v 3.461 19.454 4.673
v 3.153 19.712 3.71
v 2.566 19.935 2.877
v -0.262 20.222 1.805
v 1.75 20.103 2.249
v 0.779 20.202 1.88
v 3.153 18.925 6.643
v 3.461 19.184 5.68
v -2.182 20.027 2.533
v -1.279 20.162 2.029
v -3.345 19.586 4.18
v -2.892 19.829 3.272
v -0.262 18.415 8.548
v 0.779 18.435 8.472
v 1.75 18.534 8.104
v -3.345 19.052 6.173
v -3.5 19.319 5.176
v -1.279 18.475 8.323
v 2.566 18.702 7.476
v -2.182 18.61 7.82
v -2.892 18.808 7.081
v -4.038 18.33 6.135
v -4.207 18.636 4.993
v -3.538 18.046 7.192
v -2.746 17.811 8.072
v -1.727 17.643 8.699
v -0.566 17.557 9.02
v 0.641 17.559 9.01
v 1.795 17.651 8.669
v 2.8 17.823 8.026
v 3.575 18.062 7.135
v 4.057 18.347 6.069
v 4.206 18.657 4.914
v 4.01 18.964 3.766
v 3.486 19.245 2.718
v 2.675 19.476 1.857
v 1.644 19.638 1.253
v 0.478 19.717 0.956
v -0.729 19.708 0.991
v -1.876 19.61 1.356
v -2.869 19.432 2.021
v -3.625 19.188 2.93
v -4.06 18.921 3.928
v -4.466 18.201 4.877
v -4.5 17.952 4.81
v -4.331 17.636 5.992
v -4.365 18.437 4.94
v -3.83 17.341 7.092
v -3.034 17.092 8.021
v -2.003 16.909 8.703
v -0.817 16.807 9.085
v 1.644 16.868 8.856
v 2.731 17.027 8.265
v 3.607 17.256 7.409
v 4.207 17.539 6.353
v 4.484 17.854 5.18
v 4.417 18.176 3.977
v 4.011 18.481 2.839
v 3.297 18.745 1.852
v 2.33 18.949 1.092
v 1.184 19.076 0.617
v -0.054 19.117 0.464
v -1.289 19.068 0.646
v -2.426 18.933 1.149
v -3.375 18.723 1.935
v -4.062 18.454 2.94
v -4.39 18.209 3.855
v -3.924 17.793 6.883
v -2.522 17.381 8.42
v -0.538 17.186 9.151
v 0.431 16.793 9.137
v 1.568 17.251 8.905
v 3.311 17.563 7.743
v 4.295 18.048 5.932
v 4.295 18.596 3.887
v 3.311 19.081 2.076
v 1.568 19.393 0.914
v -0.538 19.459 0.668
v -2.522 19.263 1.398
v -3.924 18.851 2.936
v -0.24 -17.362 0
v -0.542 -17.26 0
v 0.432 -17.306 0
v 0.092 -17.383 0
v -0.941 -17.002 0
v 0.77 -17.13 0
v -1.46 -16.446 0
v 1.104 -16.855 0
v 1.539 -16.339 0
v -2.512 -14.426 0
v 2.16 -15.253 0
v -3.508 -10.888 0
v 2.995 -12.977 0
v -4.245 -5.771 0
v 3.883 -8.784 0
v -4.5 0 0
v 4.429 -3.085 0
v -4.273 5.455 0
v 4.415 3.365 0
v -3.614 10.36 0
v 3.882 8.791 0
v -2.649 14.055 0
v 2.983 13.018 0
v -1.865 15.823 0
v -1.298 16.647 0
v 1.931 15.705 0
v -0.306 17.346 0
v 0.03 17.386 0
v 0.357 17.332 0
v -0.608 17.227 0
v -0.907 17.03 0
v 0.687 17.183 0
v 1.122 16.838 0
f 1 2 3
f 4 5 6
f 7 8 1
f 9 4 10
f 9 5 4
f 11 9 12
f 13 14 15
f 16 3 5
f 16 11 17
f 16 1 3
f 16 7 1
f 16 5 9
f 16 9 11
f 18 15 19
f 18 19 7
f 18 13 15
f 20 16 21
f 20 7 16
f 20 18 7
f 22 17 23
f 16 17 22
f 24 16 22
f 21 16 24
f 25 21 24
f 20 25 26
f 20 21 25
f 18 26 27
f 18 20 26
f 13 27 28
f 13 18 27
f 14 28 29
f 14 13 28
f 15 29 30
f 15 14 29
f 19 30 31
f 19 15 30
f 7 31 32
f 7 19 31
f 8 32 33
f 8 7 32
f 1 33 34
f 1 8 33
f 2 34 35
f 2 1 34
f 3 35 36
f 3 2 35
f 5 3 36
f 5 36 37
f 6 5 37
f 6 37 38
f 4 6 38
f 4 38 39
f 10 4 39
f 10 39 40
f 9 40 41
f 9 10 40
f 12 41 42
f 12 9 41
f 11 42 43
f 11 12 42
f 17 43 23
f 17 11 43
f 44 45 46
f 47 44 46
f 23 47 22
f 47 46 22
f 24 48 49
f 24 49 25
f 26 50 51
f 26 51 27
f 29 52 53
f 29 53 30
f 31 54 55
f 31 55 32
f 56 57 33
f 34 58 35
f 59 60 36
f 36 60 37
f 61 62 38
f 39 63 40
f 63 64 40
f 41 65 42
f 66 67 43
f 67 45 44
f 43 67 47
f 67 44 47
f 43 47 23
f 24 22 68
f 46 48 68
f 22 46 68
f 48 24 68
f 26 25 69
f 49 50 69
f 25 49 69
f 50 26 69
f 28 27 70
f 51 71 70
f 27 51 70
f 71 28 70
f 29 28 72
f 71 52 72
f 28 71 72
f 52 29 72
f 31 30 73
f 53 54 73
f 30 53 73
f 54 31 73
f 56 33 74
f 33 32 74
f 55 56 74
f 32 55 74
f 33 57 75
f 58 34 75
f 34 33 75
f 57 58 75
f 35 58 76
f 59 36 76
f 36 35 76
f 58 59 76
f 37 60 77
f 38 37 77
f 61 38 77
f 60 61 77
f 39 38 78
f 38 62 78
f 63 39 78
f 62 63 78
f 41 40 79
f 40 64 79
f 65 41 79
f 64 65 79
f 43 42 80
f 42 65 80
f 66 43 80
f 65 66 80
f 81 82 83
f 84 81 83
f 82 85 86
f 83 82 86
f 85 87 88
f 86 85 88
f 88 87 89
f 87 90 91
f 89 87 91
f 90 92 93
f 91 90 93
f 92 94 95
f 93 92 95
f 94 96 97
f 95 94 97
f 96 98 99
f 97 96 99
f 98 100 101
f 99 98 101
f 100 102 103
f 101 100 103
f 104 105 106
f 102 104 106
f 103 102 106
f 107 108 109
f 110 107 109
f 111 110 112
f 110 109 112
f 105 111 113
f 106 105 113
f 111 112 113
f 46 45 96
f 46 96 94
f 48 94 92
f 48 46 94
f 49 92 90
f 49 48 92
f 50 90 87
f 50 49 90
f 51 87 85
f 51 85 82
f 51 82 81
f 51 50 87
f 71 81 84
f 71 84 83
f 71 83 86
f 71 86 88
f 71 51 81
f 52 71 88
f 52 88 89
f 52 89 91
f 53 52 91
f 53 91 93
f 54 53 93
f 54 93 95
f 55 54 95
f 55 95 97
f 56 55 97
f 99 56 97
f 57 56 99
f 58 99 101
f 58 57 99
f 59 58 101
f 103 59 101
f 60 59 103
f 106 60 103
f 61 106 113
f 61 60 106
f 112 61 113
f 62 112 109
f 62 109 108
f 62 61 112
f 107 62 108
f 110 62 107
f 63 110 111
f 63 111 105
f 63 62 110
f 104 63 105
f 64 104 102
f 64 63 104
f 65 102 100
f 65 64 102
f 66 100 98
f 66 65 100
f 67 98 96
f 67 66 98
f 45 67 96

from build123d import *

# Parameters (mm, degrees)
F2_R     = 4.5
F3_DEPTH = 20
F4_W     = 24.8413860019
F4_H     = 60.8130074764
F5_DEPTH = 25
F7_SIZE  = 1
F8_R     = 1


with BuildPart() as f3:
    # F2 (on line) → F3 (new body, symmetric)
    with BuildSketch(Plane(origin=(0, 0, 0), x_dir=(-1, 0, 0), z_dir=(0, 0.9659258263, 0.2588190451))):
        Circle(F2_R)
    extrude(amount=F3_DEPTH, both=True)

    # F4 (on Top) → F5 (cut)
    with BuildSketch(Plane.XY):
        Rectangle(F4_W, F4_H)
    extrude(amount=-F5_DEPTH, mode=Mode.SUBTRACT)

    # F7
    f7_edges = [f3.edges().sort_by_distance(p)[0] for p in [
        (4.5, 19.318517, 5.176381),
    ]]
    chamfer(f7_edges, length=F7_SIZE)

    # F8
    f8_edges = [f3.edges().sort_by_distance(p)[0] for p in [
        (4.5, 18.352591, 4.917562),
    ]]
    fillet(f8_edges, radius=F8_R)


solid = f3.part
